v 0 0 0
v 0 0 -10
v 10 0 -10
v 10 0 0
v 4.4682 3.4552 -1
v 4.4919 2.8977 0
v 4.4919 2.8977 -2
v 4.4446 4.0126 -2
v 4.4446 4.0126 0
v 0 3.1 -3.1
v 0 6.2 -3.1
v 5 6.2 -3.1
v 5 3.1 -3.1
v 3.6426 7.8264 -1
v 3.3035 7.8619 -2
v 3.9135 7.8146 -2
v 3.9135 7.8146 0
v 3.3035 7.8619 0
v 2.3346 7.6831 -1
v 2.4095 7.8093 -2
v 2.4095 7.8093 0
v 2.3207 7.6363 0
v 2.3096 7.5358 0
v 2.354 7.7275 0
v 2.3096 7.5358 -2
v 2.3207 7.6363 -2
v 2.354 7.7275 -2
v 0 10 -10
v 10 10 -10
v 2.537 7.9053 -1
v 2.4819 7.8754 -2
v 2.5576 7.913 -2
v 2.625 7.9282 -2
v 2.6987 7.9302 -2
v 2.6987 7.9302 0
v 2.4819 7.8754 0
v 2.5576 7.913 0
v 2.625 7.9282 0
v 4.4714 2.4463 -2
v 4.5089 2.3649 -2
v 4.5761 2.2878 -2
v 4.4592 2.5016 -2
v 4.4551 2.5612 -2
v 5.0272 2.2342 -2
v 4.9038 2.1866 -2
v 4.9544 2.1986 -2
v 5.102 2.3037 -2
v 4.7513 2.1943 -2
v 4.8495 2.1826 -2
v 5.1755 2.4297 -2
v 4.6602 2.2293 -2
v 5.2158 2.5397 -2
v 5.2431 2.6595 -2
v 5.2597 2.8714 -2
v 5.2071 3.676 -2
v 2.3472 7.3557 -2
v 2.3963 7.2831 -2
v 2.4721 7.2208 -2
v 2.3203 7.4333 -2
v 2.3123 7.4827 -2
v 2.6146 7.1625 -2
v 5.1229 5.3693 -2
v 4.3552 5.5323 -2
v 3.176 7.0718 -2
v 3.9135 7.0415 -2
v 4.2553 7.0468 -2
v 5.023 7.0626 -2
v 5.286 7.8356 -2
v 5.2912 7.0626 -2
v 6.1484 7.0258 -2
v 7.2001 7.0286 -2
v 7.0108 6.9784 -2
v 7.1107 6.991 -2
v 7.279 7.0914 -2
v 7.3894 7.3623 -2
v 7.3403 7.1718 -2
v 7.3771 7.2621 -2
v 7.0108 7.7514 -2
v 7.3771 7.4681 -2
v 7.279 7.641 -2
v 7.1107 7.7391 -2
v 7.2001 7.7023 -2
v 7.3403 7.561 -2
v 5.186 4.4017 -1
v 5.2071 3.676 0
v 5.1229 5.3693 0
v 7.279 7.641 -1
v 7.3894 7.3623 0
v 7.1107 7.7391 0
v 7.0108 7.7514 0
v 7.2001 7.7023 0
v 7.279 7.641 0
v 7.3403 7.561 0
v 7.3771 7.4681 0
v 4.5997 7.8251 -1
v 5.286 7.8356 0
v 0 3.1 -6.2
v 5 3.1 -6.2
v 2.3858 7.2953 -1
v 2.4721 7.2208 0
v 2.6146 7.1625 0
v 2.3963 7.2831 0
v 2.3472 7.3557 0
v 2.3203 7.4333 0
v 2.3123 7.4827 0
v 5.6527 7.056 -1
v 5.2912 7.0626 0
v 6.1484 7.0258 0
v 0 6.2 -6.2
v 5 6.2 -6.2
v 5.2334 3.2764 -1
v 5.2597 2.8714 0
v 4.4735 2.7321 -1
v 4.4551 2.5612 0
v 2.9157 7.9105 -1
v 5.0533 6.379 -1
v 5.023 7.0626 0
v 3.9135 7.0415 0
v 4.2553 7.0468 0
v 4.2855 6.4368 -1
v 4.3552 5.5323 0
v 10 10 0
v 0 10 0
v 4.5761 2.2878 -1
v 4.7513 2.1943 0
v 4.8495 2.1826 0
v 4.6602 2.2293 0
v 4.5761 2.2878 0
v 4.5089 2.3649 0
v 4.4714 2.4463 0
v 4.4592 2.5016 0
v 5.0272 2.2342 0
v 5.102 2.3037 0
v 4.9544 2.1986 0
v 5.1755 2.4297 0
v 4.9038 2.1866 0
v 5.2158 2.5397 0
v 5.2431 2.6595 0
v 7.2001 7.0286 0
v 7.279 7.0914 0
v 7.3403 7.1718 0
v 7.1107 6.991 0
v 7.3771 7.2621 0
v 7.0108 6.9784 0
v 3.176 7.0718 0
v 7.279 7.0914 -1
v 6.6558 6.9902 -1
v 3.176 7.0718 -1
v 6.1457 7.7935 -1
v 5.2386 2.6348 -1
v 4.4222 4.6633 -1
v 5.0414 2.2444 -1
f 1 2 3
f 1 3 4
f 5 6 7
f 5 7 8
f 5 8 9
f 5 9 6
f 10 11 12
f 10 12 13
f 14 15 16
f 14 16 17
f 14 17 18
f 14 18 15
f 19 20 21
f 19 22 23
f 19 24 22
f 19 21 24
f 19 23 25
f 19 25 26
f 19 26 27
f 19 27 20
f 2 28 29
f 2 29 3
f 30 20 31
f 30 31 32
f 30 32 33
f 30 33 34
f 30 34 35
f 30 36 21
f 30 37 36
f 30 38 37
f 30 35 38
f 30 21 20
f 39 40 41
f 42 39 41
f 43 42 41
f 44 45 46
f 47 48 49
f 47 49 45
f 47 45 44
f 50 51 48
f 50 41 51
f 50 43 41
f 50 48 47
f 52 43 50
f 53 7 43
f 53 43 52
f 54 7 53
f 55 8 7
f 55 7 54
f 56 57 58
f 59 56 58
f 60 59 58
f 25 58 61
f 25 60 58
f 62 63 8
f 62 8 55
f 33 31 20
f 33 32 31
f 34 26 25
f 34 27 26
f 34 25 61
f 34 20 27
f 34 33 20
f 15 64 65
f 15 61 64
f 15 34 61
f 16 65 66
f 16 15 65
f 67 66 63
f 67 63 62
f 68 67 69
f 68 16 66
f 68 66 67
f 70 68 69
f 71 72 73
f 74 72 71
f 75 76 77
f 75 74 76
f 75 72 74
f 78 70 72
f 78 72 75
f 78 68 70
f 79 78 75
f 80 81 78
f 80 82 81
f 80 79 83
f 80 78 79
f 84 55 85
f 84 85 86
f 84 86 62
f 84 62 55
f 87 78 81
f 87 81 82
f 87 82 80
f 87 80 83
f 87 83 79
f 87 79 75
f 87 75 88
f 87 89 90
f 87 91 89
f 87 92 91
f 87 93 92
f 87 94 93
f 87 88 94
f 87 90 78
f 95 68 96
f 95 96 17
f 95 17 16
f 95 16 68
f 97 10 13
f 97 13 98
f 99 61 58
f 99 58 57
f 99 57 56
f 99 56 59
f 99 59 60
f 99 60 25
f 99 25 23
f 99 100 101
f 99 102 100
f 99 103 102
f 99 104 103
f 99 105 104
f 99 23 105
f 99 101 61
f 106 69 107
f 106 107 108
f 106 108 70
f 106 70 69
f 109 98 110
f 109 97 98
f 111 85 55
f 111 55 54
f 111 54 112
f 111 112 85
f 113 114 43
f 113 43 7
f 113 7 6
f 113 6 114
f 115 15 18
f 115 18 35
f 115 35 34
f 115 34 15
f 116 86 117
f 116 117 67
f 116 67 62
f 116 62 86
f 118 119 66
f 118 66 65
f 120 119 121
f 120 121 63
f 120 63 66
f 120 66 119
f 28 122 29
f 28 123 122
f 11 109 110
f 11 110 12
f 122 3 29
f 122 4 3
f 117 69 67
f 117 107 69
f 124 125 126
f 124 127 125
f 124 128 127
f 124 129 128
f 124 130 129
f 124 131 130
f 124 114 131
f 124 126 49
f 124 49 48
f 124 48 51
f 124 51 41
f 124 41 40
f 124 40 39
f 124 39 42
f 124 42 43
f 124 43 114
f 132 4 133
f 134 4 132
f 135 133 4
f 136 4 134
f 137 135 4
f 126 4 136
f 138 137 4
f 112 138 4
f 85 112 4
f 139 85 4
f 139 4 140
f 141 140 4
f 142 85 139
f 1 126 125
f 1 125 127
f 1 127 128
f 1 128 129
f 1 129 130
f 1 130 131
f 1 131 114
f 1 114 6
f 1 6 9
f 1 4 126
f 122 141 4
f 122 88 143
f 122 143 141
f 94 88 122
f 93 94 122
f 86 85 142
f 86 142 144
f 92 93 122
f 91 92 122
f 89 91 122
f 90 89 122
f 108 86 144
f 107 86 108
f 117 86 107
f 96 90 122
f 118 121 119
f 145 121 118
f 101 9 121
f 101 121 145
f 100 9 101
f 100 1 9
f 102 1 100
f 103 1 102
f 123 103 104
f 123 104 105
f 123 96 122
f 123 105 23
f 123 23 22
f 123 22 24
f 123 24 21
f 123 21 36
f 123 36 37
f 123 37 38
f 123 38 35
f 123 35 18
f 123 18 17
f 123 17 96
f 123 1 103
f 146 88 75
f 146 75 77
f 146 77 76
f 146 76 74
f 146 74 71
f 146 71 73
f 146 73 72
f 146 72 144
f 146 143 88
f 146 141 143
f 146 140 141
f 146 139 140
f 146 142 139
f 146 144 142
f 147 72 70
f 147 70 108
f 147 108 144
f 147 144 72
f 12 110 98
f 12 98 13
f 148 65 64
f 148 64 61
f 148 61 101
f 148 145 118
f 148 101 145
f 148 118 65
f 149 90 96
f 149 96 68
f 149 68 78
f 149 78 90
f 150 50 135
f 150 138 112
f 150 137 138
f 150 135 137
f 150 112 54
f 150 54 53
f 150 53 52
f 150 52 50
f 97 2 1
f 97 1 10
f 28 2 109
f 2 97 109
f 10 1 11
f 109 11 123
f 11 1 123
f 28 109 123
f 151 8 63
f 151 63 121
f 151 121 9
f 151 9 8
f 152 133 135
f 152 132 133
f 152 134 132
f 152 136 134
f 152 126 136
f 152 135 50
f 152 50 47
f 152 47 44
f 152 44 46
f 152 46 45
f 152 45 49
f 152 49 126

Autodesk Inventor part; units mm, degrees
ref_plane "YZ Plane" through (0, 0, 0) normal (1, 0, 0) x (0, 1, 0)
ref_plane "XZ Plane" through (0, 0, 0) normal (0, 1, 0) x (-1, 0, 0)
ref_plane "XY Plane" through (0, 0, 0) normal (0, 0, 1) x (1, 0, 0)
sketch "Sketch1" plane through (0, 0, 0) normal (1, 0, 0) x (0, 1, 0)
  line L0 (0, 0) -> (10, 0)
  line L1 (10, 0) -> (10, -10)
  line L2 (10, -10) -> (0, -10)
  line L3 (0, -10) -> (0, 0)
  dimension "d0" = 10
  dimension "d1" = 10
extrude "Extrusion1" add sketch "Sketch1" along normal blind 10
sketch "Sketch4" plane through (0, 0, 0) normal (0, 0, 1) x (1, 0, 0)
  line L0 (1.8731, 7.9408) -> (4.4271, 7.9408) construction
  line L1 (4.4271, 7.9408) -> (4.4271, 4.8928) construction
  line L2 (4.4271, 4.8928) -> (1.8731, 4.8928) construction
  line L3 (1.8731, 4.8928) -> (1.8731, 7.9408) construction
  spline S0 degree 2 poles (7.0108, 6.9784) (6.7321, 6.9784) (6.1484, 7.0258) knots 0 0 0 1 1 1
  spline S1 degree 2 poles (6.1484, 7.0258) (5.5857, 7.0678) (5.2912, 7.0626) knots 0 0 0 1 1 1
  line L4 (5.2912, 7.0626) -> (5.023, 7.0626)
  spline S2 degree 2 poles (5.023, 7.0626) (5.0336, 6.542) (5.1229, 5.3693) knots 0 0 0 1 1 1
  spline S3 degree 2 poles (5.1229, 5.3693) (5.2071, 4.2808) (5.2071, 3.676) knots 0 0 0 1 1 1
  spline S4 degree 2 poles (5.2071, 3.676) (5.2071, 3.5445) (5.2597, 3.0082) (5.2597, 2.8714) knots 0 0 0 1 2 2 2
  spline S5 degree 2 poles (5.2597, 2.8714) (5.2597, 2.619) (5.1755, 2.4297) knots 0 0 0 1 1 1
  spline S6 degree 2 poles (5.1755, 2.4297) (5.0704, 2.1826) (4.8495, 2.1826) knots 0 0 0 1 1 1
  spline S7 degree 2 poles (4.8495, 2.1826) (4.697, 2.1826) (4.4551, 2.3929) (4.4551, 2.5612) knots 0 0 0 1 2 2 2
  spline S8 degree 2 poles (4.4551, 2.5612) (4.4551, 2.619) (4.4919, 2.8452) (4.4919, 2.8977) knots 0 0 0 1 2 2 2
  spline S9 degree 2 poles (4.4919, 2.8977) (4.4919, 3.087) (4.4446, 3.8233) (4.4446, 4.0126) knots 0 0 0 1 2 2 2
  spline S10 degree 2 poles (4.4446, 4.0126) (4.4446, 4.5542) (4.3552, 5.5323) knots 0 0 0 1 1 1
  spline S11 degree 2 poles (4.3552, 5.5323) (4.2658, 6.584) (4.2553, 7.0468) knots 0 0 0 1 1 1
  line L5 (4.2553, 7.0468) -> (3.9135, 7.0415)
  spline S12 degree 2 poles (3.9135, 7.0415) (3.0879, 7.0415) (2.6146, 7.1625) knots 0 0 0 1 1 1
  spline S13 degree 2 poles (2.6146, 7.1625) (2.3096, 7.2414) (2.3096, 7.5358) knots 0 0 0 1 1 1
  spline S14 degree 2 poles (2.3096, 7.5358) (2.3096, 7.6936) (2.4095, 7.8093) knots 0 0 0 1 1 1
  spline S15 degree 2 poles (2.4095, 7.8093) (2.5199, 7.9408) (2.6987, 7.9302) knots 0 0 0 1 1 1
  spline S16 degree 2 poles (2.6987, 7.9302) (2.8302, 7.925) (3.3035, 7.8619) knots 0 0 0 1 1 1
  spline S17 degree 2 poles (3.3035, 7.8619) (3.6768, 7.8146) (3.9135, 7.8146) knots 0 0 0 1 1 1
  spline S18 degree 2 poles (3.9135, 7.8146) (4.1396, 7.8146) (5.0598, 7.8356) (5.286, 7.8356) knots 0 0 0 1 2 2 2
  spline S19 degree 2 poles (5.286, 7.8356) (5.5752, 7.8356) (6.7163, 7.7514) (7.0108, 7.7514) knots 0 0 0 1 2 2 2
  spline S20 degree 2 poles (7.0108, 7.7514) (7.1686, 7.7514) (7.3894, 7.5306) (7.3894, 7.3623) knots 0 0 0 1 2 2 2
  spline S21 degree 2 poles (7.3894, 7.3623) (7.3894, 7.2045) (7.1686, 6.9784) (7.0108, 6.9784) knots 0 0 0 1 2 2 2
  point P0 (0, 0)
extrude "Extrusion4" cut sketch "Sketch4" against normal blind 2
sketch "Sketch7" plane through (0, 0, 0) normal (-1, 0, 0) x (0, 0, 1)
  line L0 (-3.1, 3.1) -> (-6.2, 3.1)
  line L1 (-6.2, 3.1) -> (-6.2, 6.2)
  line L2 (-6.2, 6.2) -> (-3.1, 6.2)
  line L3 (-3.1, 6.2) -> (-3.1, 3.1)
  point P0 (0, 0)
  dimension "d16" = 3.1
  dimension "d17" = 3.1
extrude "Extrusion6" cut sketch "Sketch7" against normal blind 5
properties part number "Thymine"
